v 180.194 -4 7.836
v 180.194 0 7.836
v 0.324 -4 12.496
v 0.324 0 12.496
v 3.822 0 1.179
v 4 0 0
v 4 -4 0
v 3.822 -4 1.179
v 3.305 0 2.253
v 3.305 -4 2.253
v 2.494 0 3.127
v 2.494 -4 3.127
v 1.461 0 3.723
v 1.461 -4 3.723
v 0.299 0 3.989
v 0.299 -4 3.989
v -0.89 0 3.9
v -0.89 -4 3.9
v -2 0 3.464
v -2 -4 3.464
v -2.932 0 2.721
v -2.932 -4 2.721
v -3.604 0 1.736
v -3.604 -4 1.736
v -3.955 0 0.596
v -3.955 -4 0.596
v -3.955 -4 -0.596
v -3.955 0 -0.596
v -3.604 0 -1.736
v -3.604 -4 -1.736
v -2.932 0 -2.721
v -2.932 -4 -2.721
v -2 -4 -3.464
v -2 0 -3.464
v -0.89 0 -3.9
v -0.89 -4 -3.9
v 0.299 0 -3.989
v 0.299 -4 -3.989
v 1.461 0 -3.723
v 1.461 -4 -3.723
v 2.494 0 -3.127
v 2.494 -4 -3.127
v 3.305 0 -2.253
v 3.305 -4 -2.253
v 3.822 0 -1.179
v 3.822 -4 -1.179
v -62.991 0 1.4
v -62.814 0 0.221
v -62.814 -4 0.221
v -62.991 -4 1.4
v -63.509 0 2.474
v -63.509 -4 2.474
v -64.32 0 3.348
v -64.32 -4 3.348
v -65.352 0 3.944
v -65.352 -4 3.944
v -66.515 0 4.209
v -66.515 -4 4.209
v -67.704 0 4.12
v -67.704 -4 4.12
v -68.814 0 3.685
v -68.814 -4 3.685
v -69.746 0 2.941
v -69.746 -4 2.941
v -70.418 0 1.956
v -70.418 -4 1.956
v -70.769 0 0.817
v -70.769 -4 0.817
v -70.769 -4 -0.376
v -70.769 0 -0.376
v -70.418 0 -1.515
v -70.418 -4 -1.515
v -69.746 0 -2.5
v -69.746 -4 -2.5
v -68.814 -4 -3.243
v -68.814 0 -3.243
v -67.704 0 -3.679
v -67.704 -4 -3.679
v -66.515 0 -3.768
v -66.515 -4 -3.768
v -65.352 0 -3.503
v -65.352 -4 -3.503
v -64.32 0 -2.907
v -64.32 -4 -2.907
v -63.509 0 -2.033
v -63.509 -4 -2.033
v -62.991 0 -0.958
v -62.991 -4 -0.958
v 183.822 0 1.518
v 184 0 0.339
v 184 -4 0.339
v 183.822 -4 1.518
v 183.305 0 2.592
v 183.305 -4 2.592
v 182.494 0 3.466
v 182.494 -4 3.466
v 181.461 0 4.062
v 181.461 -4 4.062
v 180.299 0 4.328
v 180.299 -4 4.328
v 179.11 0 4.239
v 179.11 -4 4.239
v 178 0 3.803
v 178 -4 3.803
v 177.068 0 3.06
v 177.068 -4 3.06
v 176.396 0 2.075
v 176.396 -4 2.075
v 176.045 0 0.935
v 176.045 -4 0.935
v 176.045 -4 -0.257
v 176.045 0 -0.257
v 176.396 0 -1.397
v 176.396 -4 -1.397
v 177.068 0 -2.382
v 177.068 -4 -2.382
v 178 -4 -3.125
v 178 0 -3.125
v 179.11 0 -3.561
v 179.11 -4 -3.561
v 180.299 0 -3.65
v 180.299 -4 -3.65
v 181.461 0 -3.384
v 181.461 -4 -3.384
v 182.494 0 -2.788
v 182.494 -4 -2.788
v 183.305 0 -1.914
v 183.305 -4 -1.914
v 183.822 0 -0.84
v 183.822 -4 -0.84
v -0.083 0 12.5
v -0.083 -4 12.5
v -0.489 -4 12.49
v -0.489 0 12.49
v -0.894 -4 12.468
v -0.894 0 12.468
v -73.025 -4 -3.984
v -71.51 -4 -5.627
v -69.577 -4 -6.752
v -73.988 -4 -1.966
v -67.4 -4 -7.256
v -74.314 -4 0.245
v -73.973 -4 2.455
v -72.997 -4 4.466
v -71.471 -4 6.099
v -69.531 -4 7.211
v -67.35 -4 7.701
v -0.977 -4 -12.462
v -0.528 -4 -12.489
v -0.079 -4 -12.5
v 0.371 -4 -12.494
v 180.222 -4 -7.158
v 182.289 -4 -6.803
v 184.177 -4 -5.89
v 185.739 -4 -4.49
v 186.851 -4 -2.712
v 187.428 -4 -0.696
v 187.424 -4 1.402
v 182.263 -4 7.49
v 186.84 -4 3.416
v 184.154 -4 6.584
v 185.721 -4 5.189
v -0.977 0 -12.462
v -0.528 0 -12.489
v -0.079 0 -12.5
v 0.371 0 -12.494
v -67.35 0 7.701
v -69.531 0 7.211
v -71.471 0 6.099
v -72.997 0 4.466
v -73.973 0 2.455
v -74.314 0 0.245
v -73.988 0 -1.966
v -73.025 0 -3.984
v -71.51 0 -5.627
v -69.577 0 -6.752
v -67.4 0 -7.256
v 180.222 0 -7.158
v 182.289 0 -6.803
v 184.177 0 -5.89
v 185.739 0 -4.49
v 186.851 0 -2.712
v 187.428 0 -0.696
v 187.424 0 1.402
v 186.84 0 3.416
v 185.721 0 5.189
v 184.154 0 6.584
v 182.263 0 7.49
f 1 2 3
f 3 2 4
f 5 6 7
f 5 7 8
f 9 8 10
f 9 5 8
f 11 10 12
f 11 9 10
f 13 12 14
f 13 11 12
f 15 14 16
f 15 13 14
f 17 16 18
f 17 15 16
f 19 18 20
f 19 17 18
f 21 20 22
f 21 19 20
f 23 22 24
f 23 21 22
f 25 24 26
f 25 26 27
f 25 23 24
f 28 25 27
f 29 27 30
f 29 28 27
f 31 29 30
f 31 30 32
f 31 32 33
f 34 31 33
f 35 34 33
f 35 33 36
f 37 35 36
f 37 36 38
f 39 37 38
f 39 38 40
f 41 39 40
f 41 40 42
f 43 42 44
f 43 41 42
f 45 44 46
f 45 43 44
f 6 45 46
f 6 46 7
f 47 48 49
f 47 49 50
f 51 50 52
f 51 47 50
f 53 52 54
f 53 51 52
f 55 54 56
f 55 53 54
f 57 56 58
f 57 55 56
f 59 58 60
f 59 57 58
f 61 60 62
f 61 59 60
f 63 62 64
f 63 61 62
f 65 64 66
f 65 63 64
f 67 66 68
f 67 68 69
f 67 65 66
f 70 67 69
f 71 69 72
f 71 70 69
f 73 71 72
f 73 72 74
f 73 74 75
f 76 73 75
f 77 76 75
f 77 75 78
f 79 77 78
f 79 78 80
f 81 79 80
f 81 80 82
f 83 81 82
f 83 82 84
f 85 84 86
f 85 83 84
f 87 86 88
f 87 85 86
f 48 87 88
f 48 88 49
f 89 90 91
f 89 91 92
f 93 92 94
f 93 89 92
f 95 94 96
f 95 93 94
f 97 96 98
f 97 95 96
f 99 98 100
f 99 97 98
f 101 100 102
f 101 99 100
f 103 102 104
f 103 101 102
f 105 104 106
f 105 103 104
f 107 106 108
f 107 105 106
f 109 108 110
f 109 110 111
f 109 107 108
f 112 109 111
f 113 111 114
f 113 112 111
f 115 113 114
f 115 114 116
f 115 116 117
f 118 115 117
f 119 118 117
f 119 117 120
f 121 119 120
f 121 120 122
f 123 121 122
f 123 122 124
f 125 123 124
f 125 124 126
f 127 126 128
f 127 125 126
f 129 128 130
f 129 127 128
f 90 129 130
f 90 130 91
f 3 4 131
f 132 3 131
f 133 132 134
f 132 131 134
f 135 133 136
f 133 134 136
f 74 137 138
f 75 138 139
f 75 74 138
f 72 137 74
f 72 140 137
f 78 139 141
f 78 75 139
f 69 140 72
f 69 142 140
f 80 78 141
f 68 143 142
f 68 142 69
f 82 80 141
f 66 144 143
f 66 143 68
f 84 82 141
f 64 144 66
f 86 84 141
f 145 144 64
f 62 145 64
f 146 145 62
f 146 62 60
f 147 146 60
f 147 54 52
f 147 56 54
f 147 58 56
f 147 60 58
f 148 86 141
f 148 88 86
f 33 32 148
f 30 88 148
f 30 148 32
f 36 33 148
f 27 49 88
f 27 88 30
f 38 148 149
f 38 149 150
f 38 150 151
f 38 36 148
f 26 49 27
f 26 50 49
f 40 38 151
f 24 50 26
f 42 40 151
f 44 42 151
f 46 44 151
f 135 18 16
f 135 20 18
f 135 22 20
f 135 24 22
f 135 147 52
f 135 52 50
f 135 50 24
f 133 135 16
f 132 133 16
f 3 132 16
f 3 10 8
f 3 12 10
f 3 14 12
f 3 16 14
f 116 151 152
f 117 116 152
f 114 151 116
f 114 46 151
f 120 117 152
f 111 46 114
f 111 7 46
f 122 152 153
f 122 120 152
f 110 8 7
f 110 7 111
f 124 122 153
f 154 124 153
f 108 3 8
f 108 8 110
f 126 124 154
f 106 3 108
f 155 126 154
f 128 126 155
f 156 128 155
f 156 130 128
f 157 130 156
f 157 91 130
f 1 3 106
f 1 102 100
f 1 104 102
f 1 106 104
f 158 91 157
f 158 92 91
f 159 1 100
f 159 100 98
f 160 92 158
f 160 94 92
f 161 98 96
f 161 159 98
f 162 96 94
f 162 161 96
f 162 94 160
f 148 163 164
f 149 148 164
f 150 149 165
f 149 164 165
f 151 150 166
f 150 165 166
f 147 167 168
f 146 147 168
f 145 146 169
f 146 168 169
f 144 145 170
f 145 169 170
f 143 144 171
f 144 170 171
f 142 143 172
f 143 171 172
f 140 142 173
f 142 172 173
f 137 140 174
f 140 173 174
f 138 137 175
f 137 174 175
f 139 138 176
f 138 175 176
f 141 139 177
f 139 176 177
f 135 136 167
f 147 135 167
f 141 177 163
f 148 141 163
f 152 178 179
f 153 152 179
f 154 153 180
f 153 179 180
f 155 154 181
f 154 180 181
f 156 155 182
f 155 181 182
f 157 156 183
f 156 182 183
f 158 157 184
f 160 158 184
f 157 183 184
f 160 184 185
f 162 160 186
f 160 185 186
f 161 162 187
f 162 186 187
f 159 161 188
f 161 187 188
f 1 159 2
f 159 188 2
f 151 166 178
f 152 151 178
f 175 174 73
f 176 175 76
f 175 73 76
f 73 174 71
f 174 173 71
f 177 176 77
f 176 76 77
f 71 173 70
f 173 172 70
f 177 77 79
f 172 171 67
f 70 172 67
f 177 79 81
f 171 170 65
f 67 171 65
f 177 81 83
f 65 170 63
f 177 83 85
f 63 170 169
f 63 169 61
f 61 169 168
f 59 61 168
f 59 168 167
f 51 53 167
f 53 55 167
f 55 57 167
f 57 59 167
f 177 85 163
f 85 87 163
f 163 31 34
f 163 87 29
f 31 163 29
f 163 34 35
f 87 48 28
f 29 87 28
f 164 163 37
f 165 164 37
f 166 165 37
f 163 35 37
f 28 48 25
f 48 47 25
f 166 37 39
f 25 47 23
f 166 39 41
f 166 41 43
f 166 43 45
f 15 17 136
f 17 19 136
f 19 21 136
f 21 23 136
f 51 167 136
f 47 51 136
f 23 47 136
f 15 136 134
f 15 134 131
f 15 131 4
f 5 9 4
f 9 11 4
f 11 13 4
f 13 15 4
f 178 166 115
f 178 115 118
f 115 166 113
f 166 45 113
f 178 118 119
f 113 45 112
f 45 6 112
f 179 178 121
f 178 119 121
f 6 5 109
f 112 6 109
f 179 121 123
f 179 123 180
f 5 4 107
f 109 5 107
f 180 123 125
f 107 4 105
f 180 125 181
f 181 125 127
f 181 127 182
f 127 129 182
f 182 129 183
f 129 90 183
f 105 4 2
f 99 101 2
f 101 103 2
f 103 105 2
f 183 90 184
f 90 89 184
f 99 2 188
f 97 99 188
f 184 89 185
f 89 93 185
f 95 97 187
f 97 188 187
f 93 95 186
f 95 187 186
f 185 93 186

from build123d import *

# Parameters (mm, degrees)
F0_R     = 4
F1_DEPTH = 4


with BuildPart() as f1:
    # F0 (on Front) → F1 (new body)
    with BuildSketch(Plane.XZ):
        with BuildLine():
            Line((-0.894263, 12.467971), (-67.350288, 7.701424))
            ThreePointArc((-67.350288, 7.701424), (-74.313689, 0.245409), (-67.399684, -7.256434))
            Line((-67.399684, -7.256434), (-0.97659, -12.461793))
            ThreePointArc((-0.97659, -12.461793), (-0.303359, -12.496318), (0.370754, -12.4945))
            Line((0.370754, -12.4945), (180.222452, -7.1577))
            ThreePointArc((180.222452, -7.1577), (187.499987, 0.353125), (180.194213, 7.836485))
            Line((180.194213, 7.836485), (0.323688, 12.495808))
            ThreePointArc((0.323688, 12.495808), (-0.285627, 12.496736), (-0.894263, 12.467971))
        make_face()
        with Locations((-66.81373, 0.220642)):
            Circle(F0_R, mode=Mode.SUBTRACT)
        Circle(F0_R, mode=Mode.SUBTRACT)
        with Locations((180, 0.339)):
            Circle(F0_R, mode=Mode.SUBTRACT)
    extrude(amount=F1_DEPTH)


solid = f1.part
